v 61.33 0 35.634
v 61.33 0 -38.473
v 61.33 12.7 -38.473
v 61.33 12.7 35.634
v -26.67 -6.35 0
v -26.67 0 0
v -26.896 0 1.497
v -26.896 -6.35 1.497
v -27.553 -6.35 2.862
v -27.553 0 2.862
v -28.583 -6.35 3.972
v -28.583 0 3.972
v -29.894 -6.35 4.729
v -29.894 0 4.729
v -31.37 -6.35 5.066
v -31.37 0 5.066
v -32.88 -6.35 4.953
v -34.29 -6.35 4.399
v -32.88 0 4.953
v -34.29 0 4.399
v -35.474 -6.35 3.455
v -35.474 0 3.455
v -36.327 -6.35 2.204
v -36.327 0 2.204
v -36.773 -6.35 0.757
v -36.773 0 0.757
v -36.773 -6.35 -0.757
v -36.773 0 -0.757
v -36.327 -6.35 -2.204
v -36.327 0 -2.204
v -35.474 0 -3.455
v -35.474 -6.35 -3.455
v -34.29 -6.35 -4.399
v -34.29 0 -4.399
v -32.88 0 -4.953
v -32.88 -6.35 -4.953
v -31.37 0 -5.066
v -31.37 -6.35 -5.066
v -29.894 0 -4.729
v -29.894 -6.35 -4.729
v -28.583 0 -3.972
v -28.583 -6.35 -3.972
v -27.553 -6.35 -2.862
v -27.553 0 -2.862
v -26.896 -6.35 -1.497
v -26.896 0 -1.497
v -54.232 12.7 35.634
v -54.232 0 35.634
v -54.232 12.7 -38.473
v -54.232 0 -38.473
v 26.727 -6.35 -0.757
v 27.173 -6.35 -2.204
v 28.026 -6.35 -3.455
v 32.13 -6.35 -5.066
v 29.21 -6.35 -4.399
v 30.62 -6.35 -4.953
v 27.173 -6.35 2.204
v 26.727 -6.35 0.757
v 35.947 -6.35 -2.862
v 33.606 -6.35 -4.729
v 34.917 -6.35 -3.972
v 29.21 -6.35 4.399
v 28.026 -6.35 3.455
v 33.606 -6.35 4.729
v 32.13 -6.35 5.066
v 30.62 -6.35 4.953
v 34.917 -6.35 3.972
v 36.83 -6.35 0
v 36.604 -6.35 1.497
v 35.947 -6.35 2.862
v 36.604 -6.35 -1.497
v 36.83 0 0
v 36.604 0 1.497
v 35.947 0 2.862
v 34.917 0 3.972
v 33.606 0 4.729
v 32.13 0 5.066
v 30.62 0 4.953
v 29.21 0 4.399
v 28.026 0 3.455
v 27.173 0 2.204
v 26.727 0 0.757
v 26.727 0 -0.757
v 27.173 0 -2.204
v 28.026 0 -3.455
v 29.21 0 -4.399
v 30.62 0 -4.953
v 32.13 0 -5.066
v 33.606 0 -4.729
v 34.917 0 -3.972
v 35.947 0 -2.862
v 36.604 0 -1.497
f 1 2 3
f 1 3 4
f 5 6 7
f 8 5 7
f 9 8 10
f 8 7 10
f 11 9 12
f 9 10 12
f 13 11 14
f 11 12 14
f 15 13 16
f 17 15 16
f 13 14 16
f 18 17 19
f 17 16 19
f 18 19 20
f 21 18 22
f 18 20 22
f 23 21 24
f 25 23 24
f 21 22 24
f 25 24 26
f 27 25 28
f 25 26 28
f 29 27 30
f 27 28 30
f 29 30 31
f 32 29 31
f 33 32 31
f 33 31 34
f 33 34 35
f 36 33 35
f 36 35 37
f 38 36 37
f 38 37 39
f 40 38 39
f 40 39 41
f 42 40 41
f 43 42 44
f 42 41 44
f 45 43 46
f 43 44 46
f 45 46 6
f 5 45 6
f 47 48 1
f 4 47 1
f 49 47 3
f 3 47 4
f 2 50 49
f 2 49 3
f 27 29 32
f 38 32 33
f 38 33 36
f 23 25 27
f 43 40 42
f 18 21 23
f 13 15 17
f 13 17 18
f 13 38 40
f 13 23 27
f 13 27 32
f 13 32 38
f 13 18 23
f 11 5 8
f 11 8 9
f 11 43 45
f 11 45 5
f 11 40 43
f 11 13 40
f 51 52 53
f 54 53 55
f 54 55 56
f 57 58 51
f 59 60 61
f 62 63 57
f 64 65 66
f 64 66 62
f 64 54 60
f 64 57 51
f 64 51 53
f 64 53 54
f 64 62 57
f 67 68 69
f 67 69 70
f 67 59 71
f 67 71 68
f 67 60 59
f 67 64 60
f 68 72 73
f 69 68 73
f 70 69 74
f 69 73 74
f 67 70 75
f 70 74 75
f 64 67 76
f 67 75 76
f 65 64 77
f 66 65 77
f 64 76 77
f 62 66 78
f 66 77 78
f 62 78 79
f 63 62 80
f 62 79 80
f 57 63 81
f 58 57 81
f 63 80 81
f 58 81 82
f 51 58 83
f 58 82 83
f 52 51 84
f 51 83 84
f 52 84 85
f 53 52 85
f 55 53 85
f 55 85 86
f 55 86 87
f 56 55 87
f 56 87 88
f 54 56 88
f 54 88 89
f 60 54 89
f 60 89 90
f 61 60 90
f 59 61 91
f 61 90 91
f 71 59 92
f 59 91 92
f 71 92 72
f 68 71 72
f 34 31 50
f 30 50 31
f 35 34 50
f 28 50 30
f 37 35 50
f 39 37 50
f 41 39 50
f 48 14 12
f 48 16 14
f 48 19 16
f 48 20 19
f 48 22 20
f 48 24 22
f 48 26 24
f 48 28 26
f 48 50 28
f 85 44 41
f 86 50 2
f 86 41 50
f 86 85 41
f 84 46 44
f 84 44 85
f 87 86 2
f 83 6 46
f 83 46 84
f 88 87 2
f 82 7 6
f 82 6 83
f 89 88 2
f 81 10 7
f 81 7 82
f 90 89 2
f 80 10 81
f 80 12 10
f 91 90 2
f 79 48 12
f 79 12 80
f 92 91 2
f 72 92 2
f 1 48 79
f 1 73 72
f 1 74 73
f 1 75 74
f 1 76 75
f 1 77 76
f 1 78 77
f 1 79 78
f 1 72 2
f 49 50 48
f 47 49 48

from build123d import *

# Parameters (mm, degrees)
F0_W     = 115.562398
F0_H     = 74.107583
F1_DEPTH = 12.7
F2_R     = 5.08
F3_DEPTH = 6.35


with BuildPart() as f1:
    # F0 (on Front) → F1 (new body)
    with BuildSketch(Plane.XZ):
        with Locations((3.549216, -1.419687)):
            Rectangle(F0_W, F0_H)
    extrude(amount=-F1_DEPTH)

    # F2 (on Front) → F3 (join)
    with BuildSketch(Plane.XZ):
        with Locations((-31.75, 0)):
            Circle(F2_R)
        with Locations((31.75, 0)):
            Circle(F2_R)
    extrude(amount=F3_DEPTH)


solid = f1.part
